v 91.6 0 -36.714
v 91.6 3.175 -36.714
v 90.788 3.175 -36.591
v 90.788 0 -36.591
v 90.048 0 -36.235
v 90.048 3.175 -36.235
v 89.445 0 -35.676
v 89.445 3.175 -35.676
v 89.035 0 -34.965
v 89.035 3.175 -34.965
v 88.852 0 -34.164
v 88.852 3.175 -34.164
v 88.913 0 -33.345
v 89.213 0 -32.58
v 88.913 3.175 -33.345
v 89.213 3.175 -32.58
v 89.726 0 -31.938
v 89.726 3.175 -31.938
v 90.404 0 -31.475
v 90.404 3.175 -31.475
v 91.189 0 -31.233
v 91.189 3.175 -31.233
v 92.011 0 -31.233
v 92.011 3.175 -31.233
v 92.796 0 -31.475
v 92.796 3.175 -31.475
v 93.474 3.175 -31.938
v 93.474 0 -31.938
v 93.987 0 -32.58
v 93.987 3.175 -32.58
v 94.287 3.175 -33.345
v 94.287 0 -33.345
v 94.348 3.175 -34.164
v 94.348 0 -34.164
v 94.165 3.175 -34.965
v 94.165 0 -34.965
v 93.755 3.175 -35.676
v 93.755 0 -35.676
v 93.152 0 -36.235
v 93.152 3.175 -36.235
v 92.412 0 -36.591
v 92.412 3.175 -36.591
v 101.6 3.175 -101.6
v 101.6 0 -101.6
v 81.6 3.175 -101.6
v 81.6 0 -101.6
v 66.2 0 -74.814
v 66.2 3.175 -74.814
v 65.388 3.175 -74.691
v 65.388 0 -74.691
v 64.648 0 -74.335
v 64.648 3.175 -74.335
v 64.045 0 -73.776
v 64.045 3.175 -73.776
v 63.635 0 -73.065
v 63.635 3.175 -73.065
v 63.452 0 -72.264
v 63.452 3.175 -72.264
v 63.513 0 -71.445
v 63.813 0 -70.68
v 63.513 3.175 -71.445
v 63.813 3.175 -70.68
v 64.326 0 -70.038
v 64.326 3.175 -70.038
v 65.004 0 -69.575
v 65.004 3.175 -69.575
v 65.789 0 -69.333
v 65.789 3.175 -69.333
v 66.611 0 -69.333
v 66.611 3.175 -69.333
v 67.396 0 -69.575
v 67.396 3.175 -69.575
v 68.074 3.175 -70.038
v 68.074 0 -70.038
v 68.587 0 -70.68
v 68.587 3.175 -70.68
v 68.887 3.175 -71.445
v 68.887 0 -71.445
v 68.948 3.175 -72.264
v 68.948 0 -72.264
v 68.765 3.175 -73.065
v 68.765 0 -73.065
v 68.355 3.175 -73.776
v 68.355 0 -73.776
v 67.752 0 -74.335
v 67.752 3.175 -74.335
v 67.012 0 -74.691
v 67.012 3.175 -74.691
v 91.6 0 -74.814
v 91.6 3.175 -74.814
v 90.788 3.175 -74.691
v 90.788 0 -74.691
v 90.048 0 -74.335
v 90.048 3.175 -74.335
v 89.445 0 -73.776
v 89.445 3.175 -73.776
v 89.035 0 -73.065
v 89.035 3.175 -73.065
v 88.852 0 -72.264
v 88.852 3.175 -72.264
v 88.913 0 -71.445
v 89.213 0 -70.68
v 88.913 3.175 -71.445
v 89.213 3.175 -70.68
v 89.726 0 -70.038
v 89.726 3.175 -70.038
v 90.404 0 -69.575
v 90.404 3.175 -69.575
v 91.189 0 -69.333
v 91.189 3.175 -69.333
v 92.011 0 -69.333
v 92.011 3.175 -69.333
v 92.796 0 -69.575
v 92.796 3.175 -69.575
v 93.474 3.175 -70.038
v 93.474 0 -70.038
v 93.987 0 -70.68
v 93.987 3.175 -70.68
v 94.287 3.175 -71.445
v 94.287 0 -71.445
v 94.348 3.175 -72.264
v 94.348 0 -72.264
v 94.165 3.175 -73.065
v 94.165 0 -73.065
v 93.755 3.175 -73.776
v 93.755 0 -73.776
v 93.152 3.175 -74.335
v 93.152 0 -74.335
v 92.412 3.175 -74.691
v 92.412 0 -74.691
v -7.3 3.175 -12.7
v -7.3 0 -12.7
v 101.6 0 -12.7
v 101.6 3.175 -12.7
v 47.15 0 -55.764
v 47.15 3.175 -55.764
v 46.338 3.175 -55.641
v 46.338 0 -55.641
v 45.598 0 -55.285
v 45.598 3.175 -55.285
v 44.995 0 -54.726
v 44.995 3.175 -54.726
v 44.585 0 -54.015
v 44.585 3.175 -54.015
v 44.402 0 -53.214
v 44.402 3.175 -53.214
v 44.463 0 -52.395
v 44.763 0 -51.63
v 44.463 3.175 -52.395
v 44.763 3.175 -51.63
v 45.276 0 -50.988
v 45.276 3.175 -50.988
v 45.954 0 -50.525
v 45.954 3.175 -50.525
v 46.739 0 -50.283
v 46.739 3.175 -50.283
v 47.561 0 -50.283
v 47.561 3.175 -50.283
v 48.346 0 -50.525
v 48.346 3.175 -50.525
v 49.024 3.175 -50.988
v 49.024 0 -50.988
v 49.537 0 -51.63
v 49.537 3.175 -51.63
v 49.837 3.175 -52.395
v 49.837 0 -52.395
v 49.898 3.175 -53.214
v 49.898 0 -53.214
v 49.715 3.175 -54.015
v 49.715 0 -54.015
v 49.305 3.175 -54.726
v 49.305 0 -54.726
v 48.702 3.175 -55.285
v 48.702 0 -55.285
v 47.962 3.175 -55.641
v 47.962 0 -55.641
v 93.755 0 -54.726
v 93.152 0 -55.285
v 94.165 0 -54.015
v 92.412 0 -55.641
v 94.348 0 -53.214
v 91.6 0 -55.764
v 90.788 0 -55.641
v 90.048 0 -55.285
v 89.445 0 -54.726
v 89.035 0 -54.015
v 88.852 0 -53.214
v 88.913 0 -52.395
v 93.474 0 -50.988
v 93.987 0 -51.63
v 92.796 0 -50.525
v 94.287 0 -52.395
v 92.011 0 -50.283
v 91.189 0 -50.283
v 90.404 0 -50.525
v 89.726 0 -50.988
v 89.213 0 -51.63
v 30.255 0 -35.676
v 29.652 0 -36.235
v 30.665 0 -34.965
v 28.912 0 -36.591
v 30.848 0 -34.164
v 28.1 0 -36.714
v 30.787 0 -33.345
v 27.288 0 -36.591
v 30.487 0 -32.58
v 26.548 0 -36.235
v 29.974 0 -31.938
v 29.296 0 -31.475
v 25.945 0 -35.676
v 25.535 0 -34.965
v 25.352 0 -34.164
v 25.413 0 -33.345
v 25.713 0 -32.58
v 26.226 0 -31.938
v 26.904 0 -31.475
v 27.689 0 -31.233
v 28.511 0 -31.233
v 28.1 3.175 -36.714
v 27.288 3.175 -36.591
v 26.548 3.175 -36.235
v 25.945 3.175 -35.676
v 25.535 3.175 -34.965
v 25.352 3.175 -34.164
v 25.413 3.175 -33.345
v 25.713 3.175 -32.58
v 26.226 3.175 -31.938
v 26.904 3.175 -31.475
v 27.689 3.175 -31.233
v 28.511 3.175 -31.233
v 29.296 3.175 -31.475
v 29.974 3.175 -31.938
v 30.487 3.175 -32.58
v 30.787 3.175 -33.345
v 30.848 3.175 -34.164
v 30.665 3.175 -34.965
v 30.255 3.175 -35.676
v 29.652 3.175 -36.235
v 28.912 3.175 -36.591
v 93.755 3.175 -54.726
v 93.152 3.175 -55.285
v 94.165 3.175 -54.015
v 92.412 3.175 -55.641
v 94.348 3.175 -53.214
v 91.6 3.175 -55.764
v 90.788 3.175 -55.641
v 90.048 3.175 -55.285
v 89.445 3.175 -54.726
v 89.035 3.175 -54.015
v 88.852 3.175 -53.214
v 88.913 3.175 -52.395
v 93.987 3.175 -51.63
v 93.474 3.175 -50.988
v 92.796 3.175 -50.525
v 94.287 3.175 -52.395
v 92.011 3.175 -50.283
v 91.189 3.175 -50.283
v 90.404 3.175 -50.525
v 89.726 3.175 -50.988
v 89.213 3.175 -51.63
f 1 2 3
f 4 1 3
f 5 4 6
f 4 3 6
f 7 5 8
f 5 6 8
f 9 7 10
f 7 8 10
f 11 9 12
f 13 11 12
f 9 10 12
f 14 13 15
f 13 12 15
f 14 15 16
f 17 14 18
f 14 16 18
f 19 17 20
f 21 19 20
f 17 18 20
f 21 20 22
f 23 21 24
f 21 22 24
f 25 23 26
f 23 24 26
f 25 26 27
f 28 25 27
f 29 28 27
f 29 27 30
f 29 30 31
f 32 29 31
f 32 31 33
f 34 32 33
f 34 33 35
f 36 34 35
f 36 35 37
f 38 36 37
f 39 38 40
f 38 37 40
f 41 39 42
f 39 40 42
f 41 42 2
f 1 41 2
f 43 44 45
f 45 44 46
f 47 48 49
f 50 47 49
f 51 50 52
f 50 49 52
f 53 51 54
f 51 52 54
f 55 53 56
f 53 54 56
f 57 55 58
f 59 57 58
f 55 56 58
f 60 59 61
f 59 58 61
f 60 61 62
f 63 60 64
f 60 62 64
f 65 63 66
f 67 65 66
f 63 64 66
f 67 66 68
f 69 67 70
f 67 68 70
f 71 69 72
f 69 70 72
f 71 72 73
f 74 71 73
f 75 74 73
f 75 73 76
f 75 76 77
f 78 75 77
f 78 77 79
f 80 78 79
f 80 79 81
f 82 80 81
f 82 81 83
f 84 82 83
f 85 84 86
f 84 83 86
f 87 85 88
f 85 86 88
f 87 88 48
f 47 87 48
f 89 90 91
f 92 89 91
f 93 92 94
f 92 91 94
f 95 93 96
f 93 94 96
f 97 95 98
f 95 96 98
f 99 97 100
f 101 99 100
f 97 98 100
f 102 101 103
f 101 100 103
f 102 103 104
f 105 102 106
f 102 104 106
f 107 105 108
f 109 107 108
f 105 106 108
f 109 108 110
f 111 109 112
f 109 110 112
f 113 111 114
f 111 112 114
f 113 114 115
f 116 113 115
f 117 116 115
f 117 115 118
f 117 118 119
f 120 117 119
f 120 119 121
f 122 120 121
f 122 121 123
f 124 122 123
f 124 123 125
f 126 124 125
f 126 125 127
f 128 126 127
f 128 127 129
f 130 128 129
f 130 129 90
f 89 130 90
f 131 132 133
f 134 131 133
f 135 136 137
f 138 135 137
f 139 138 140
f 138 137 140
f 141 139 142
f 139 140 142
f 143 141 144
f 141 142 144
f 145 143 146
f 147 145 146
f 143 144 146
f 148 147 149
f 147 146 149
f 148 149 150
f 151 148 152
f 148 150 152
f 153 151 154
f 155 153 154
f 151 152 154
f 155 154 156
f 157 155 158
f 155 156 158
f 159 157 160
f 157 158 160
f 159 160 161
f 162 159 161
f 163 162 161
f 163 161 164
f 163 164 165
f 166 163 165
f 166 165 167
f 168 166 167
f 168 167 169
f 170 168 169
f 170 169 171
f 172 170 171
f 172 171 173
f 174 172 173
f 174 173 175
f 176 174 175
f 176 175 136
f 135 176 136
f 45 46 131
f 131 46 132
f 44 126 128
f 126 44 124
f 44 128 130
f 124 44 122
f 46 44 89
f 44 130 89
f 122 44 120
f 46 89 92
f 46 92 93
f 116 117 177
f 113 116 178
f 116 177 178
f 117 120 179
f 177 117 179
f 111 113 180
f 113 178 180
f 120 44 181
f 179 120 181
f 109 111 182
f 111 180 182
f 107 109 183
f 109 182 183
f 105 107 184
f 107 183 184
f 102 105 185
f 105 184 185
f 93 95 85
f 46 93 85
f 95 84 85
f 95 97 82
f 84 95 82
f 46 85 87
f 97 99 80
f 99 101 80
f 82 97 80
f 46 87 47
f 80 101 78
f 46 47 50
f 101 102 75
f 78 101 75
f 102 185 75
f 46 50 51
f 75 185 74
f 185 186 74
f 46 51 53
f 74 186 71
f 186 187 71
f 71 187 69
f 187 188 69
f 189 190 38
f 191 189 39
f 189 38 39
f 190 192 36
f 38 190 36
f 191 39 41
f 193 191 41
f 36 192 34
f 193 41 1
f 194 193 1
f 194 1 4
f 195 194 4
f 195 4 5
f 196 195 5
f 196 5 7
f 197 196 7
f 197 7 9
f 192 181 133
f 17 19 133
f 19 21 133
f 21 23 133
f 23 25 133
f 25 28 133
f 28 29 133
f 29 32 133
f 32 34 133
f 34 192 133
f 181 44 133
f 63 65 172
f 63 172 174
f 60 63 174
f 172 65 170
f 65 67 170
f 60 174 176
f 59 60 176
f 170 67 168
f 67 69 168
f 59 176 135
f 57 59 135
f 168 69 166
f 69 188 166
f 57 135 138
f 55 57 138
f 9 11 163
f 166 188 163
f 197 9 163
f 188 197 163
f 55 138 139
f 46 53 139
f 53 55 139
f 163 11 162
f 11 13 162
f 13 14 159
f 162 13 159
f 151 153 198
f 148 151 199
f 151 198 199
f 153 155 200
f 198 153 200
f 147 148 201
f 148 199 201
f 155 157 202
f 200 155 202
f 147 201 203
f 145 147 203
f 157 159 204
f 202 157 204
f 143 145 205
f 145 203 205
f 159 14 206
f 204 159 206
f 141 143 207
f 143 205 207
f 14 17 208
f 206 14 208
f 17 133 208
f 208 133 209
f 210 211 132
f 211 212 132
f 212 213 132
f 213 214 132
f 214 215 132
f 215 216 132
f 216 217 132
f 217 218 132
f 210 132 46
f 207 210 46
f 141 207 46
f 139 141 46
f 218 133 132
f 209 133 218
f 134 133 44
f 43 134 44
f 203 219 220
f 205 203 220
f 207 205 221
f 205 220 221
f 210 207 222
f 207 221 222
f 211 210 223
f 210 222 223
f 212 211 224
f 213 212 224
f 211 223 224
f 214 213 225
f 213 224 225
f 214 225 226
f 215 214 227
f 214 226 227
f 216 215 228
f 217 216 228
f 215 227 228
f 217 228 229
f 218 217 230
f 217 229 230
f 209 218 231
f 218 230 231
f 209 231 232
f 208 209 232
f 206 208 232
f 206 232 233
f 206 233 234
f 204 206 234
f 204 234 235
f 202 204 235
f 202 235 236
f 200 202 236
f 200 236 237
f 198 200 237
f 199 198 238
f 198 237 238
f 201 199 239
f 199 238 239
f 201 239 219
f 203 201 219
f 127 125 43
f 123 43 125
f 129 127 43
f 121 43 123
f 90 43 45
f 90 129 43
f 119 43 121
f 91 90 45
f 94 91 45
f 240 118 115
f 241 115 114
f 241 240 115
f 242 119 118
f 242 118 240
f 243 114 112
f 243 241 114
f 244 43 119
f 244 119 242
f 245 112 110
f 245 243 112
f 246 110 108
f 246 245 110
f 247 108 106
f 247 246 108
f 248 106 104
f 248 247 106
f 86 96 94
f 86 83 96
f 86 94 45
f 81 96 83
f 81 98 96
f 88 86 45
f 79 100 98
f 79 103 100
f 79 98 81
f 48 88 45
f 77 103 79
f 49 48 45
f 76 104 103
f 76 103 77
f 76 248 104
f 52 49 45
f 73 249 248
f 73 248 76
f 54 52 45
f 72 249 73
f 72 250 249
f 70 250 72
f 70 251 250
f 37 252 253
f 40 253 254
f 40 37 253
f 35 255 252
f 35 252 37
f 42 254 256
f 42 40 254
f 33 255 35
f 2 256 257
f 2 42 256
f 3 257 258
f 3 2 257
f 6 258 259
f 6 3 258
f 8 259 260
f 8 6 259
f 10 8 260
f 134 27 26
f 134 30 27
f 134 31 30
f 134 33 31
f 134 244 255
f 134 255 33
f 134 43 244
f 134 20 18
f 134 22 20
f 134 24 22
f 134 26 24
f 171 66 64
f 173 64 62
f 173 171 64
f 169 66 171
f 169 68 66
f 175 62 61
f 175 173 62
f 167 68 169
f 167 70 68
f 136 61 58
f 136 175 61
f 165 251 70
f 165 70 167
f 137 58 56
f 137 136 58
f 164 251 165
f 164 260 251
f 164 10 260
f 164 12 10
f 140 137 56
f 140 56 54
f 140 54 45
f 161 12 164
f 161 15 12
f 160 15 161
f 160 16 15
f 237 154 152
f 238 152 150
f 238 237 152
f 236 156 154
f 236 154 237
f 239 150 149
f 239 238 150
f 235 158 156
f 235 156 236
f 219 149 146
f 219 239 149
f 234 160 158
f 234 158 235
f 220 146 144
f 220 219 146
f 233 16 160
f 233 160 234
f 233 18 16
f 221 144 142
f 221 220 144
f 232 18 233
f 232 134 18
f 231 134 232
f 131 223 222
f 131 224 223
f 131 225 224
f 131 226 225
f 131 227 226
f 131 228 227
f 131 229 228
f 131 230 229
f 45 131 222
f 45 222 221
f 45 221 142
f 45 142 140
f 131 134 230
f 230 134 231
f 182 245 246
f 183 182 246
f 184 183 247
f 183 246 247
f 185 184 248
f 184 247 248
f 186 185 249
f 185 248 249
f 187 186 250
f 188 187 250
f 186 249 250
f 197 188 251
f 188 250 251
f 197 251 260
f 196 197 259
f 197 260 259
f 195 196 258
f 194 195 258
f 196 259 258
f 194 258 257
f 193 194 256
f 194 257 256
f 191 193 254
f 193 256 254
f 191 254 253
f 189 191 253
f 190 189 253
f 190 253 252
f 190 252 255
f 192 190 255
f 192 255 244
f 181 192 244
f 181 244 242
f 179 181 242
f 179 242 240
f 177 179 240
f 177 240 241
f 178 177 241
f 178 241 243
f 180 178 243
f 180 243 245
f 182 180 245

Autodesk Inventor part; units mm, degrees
ref_plane "YZ Plane" through (0, 0, 0) normal (1, 0, 0) x (0, 1, 0)
ref_plane "XZ Plane" through (0, 0, 0) normal (0, 1, 0) x (-1, 0, 0)
ref_plane "XY Plane" through (0, 0, 0) normal (0, 0, 1) x (1, 0, 0)
sketch "Sketch1" plane through (0, 0, 0) normal (0, 1, 0) x (-1, 0, 0)
  line L0 (0, 0) -> (-101.6, 0) construction
  line L1 (-101.6, 0) -> (-101.6, -101.6) construction
  line L2 (-101.6, -101.6) -> (0, -101.6) construction
  line L3 (0, -101.6) -> (0, 0) construction
  line L4 (-101.6, 15.5049) -> (-81.6, 15.5049) construction
  line L5 (-81.6, 15.5049) -> (-81.6, -123.9701) construction
  line L6 (-81.6, -123.9701) -> (-101.6, -123.9701) construction
  line L7 (-101.6, -123.9701) -> (-101.6, 15.5049) construction
  line L8 (-81.6, -101.6) -> (54.3539, 34.3539) construction
  line L9 (54.3539, 34.3539) -> (40.2117, 48.496) construction
  line L10 (40.2117, 48.496) -> (-81.6, -73.3157) construction
  line L11 (-101.6, -101.6) -> (-81.6, -101.6)
  line L12 (-81.6, -101.6) -> (-3.5401, -23.5401)
  line L13 (-8.0303, -12.7) -> (-101.6, -12.7)
  line L14 (-101.6, -12.7) -> (-101.6, -101.6)
  circle A0 centre (-66.2, -72.0579) radius 4.2211
  circle A1 centre (-28.1, -33.9579) radius 4.2211
  circle A2 centre (-91.6, -33.9579) radius 4.2211
  circle A3 centre (-91.6, -72.0579) radius 4.2211
  line L15 (-81.6, -101.6) -> (-101.6, -121.6)
  line L16 (-101.6, -101.6) -> (-101.6, -121.6)
  line L17 (-28.1, -33.9579) -> (-66.2, -72.0579) construction
  line L18 (-8.0303, -12.7) -> (7.3, -12.7)
  line L19 (-3.5401, -23.5401) -> (7.3, -12.7)
  circle A4 centre (-47.15, -53.0079) radius 3.9521
  circle A5 centre (-91.6, -53.0079) radius 4.2211
  dimension "d0" = 101.6
  dimension "d1" = 101.6
  dimension "d2" = 20
  dimension "d3" = 20
  dimension "d4" = 45
  dimension "d11" = 10
  dimension "d13" = 10
  dimension "d15" = 25.4
  dimension "d16" = 38.1
  dimension "d17" = 88.9
extrude "Extrusion1" add sketch "Sketch1" along normal blind 3.175 contours L14 L13 L18 L19 L12 L11 | A0 | A1 | A2 | A3 | A4 | A5
hole "Hole1" at (91.6, 0, -33.9579) at (91.6, 0, -72.0579) at (66.2, 0, -72.0579) at (28.1, 0, -33.9579) at (47.15, 0, -53.0079) at (91.6, 0, -53.0079) direction (0, 1, 0) diameter 5.5118 end through all clearance for "Flat Head Machine Screw" size "M5" standard "Ansi Metric M Profile"
equation "\"d3\" = d2"
properties part number "CH-1-01-FrontKneeJoint"
